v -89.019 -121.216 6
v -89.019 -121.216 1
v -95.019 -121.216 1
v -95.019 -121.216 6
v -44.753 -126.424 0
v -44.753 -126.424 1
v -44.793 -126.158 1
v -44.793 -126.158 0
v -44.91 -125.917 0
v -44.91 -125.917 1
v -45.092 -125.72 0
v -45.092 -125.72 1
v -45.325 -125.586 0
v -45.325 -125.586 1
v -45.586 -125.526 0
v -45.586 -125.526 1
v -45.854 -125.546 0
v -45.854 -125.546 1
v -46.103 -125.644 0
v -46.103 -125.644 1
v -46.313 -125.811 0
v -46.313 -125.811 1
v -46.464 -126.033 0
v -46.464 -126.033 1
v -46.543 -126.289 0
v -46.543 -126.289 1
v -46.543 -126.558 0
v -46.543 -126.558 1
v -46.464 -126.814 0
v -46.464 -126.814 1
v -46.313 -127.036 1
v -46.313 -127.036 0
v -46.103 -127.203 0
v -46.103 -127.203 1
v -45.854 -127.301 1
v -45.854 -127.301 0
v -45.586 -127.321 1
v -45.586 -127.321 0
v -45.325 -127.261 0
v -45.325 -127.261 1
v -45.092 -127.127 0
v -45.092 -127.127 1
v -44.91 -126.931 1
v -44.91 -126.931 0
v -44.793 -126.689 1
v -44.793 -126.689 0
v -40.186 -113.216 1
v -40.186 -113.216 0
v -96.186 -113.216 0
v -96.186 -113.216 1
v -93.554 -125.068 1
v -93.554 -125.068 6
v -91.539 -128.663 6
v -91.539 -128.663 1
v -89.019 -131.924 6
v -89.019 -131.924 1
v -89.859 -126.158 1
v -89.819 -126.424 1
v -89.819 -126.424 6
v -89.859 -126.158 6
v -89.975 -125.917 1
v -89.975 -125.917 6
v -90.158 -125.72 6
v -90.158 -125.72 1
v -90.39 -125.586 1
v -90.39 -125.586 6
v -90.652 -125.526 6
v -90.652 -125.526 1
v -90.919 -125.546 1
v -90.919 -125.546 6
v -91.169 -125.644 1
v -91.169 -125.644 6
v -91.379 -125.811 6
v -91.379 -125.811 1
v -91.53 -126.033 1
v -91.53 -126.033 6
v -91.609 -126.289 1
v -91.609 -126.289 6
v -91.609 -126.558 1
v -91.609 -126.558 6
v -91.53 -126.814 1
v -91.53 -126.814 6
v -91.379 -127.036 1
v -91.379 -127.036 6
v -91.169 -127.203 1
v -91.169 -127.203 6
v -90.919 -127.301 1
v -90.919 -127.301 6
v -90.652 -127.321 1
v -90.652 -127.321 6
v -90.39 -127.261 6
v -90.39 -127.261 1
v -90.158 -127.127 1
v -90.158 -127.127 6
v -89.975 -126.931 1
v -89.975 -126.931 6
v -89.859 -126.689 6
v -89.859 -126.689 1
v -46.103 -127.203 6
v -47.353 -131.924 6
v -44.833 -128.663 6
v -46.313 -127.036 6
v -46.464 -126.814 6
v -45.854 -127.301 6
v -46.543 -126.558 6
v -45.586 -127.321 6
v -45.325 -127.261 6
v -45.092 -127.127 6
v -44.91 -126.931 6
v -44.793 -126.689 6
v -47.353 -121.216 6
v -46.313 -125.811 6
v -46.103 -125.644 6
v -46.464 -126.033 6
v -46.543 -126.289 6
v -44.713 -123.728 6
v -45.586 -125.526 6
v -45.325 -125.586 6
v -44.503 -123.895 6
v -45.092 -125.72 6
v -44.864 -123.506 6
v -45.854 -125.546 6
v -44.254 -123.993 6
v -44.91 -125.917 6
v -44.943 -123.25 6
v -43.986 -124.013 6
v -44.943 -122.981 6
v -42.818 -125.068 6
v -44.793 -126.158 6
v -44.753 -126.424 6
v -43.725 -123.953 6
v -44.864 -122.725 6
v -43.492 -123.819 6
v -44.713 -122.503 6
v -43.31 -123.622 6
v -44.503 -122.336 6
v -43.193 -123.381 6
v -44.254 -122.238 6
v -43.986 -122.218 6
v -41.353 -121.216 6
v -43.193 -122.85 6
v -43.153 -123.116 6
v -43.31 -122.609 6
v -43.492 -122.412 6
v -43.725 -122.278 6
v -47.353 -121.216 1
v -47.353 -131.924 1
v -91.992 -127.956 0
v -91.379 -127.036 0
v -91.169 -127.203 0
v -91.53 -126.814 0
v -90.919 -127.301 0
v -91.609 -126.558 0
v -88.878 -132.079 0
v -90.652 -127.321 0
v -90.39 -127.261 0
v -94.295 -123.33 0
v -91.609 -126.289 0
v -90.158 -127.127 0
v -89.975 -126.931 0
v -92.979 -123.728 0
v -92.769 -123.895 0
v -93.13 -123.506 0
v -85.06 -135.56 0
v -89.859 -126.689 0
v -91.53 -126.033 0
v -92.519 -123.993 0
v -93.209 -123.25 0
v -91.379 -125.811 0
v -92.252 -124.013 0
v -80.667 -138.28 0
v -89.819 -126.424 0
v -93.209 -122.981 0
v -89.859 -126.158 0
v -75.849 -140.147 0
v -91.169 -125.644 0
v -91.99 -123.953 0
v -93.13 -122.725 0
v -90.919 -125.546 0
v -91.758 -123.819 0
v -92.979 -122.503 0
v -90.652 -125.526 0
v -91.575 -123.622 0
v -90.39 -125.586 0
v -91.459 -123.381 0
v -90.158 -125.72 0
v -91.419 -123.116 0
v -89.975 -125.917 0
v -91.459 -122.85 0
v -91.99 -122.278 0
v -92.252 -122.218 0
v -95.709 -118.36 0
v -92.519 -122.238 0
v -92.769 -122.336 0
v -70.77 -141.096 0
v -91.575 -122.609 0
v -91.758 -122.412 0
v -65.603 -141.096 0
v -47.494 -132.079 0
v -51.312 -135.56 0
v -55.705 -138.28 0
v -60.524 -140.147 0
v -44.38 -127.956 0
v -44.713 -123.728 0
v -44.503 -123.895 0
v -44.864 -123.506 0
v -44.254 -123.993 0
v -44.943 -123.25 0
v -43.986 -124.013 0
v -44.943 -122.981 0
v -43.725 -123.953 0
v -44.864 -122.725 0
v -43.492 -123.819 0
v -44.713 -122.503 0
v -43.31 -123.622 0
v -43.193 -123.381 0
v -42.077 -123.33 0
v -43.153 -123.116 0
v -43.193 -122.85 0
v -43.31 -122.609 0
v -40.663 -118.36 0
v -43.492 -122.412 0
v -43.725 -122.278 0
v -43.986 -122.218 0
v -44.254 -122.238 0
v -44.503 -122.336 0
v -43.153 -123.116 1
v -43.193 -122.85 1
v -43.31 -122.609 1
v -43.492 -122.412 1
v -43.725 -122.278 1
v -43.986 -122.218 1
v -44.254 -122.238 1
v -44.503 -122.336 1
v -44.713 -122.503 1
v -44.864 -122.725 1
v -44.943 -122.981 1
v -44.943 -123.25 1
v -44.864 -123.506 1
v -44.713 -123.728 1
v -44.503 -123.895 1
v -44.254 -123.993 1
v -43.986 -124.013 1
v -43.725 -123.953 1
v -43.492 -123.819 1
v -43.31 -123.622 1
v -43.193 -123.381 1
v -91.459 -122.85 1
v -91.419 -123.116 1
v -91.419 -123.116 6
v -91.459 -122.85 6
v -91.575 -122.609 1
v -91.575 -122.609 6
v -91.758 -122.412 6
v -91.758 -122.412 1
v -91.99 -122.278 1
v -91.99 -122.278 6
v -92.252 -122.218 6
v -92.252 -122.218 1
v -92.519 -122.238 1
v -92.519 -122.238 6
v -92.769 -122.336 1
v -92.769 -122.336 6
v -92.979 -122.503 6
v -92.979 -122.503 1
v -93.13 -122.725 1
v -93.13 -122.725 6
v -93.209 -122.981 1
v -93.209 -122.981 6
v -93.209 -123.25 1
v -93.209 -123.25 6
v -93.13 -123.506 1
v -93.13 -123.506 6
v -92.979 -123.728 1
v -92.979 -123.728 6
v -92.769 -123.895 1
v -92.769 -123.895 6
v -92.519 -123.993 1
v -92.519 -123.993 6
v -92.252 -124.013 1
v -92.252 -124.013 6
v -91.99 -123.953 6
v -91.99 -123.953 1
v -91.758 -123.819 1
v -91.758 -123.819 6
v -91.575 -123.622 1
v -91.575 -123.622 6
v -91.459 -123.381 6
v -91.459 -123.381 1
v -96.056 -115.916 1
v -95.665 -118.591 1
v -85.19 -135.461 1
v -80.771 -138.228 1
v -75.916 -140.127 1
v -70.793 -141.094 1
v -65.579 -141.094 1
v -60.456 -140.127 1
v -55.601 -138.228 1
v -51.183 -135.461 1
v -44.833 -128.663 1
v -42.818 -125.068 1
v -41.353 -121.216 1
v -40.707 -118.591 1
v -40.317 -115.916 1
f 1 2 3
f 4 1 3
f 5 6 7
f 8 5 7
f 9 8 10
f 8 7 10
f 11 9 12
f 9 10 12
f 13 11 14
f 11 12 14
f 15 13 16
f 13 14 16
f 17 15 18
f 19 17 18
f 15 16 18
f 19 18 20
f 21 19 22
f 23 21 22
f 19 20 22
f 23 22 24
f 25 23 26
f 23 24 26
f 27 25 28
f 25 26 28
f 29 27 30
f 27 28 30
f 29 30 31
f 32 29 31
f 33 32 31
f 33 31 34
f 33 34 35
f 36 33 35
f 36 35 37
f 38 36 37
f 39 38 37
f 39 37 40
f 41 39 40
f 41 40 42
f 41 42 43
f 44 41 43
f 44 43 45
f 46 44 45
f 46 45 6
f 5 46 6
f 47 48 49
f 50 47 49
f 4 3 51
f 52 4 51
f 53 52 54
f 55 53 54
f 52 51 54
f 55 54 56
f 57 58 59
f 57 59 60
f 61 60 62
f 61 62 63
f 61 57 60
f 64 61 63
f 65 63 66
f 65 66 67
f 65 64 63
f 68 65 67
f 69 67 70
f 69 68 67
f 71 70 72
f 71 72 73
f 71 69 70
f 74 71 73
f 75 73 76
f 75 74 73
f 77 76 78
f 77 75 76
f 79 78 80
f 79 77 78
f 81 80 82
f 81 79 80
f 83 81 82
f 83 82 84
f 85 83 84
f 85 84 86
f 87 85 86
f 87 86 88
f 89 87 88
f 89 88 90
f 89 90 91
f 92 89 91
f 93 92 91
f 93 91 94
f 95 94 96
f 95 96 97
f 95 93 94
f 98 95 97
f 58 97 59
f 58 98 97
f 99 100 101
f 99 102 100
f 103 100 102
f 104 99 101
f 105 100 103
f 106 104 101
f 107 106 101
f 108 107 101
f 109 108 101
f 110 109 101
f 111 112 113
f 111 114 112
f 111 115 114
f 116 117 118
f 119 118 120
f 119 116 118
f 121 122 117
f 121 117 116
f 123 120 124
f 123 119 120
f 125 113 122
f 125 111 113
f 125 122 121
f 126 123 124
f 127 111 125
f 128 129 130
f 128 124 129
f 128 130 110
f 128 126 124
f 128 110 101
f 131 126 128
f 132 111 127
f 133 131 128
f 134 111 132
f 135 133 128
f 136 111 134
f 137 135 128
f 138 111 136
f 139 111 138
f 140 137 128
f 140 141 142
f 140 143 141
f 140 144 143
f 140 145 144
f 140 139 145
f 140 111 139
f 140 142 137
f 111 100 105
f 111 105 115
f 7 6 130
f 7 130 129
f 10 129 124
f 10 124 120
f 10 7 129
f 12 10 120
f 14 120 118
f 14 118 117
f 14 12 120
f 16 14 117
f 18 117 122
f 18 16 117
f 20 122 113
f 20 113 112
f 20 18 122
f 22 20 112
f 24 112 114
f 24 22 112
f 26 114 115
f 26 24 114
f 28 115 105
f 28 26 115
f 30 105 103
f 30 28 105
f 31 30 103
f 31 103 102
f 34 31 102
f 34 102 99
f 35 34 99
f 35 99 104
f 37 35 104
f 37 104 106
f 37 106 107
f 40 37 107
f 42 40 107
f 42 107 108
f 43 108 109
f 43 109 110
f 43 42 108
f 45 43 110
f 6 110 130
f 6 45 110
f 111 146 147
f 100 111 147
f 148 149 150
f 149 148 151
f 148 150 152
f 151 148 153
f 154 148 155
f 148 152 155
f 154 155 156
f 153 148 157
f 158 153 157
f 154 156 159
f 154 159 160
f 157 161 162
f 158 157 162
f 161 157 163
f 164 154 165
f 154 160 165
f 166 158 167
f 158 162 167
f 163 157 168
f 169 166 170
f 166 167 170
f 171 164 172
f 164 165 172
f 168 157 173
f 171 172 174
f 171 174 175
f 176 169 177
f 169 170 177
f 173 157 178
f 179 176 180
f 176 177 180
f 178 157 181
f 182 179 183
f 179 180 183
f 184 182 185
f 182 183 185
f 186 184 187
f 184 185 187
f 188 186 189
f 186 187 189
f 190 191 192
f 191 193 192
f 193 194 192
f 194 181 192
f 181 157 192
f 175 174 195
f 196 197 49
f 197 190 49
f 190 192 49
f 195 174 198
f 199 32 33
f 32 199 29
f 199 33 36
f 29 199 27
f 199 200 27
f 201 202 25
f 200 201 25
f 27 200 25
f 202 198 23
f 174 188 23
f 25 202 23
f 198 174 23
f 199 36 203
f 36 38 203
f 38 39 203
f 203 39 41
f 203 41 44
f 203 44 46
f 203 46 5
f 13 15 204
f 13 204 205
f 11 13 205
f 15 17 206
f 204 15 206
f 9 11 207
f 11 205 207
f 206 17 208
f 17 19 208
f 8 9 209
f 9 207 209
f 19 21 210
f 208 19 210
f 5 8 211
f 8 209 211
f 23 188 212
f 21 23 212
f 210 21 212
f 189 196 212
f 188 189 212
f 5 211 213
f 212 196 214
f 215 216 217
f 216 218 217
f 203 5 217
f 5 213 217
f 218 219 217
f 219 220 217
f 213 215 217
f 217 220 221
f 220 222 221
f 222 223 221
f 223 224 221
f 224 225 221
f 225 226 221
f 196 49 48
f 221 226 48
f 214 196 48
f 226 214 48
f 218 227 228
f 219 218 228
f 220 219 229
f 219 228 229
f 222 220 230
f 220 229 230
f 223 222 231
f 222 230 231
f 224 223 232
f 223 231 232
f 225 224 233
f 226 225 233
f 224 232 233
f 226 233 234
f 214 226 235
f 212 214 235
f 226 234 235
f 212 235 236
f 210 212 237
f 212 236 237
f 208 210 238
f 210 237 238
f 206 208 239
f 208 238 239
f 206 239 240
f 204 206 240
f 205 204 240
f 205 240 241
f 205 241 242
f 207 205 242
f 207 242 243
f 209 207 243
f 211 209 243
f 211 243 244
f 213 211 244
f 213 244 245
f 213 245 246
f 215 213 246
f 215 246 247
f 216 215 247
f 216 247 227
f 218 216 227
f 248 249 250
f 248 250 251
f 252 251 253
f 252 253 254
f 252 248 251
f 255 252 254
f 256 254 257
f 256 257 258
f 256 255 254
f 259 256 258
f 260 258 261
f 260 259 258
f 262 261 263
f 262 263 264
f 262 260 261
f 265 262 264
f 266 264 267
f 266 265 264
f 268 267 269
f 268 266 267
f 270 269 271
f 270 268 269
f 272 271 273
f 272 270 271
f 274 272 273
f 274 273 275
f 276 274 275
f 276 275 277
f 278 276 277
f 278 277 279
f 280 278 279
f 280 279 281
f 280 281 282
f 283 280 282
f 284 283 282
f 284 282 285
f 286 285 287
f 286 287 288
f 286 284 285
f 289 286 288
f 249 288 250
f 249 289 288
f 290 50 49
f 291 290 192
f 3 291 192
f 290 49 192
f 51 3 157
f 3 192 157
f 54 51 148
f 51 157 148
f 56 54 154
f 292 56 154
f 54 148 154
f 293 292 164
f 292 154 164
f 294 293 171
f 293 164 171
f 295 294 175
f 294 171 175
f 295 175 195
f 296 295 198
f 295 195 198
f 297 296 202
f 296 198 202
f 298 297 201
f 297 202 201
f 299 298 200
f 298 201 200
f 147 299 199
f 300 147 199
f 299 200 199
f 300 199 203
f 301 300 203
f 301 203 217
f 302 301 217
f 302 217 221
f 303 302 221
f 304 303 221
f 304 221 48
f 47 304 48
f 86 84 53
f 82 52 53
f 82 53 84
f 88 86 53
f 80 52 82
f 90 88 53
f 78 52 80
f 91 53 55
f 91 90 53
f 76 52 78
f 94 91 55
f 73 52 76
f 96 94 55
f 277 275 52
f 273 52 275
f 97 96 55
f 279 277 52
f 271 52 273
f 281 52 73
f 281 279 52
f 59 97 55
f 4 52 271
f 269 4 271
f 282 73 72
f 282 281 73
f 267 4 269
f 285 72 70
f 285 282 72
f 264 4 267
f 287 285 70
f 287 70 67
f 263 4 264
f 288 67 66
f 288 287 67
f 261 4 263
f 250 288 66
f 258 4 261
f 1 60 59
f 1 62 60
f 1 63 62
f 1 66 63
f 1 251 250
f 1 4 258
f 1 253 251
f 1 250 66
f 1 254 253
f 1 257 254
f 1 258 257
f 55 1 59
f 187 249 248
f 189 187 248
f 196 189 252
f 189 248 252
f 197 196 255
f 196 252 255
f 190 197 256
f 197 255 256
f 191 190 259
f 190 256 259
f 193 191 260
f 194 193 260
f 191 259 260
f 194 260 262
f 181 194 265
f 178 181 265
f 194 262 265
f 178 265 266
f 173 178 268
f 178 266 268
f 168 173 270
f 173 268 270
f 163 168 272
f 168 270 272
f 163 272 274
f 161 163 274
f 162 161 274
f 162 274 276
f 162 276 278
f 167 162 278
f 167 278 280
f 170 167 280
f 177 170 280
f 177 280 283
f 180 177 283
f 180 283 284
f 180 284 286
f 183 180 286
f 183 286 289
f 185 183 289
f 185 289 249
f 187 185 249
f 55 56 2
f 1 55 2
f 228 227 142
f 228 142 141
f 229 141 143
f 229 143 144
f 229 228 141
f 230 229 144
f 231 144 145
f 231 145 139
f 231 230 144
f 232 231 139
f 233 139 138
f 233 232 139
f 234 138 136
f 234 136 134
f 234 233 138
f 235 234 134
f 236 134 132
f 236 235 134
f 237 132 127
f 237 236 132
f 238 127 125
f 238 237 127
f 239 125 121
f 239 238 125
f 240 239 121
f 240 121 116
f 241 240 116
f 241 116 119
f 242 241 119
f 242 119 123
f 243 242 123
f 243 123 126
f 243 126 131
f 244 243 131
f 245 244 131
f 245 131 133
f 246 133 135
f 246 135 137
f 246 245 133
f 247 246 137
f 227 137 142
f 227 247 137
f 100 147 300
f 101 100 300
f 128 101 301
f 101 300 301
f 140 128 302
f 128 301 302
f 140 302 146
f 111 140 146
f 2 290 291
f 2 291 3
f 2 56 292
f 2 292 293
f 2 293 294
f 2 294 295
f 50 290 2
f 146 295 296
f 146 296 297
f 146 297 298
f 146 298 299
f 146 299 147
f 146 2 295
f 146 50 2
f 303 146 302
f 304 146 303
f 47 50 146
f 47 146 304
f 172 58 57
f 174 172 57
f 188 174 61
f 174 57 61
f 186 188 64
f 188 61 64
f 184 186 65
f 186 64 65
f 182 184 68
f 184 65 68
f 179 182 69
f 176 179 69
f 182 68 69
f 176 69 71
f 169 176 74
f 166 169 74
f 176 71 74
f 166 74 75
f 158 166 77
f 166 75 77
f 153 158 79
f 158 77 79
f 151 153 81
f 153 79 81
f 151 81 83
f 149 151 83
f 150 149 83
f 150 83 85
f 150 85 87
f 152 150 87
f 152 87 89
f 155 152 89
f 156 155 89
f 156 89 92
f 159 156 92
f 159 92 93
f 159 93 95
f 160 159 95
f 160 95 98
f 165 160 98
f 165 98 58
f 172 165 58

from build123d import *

# Parameters (mm, degrees)
F1_DEPTH = 1
F2_R     = 0.9
F3_DEPTH = 5
F4_DEPTH = 1.001


with BuildPart() as f1:
    # F0 (on Top) → F1 (new body)
    with BuildSketch(Plane.XY):
        with BuildLine():
            ThreePointArc((-96.1861413951, -113.2155081954), (-68.1861413951, -141.2155081954), (-40.1861413951, -113.2155081954))
            Line((-40.1861413951, -113.2155081954), (-96.1861413951, -113.2155081954))
        make_face()
    extrude(amount=F1_DEPTH)

    # F2 (on face) → F3 (join)
    with BuildSketch(Plane.XY.offset(1)):
        with BuildLine():
            Line((-89.0189571251, -121.2155081954), (-95.0189571251, -121.2155081954))
            ThreePointArc((-95.0189571251, -121.2155081954), (-92.6129518517, -126.9023972105), (-89.0189571251, -131.9236291261))
            Line((-89.0189571251, -131.9236291261), (-89.0189571251, -121.2155081954))
        make_face()
        with Locations((-90.7189571251, -126.4236291261)):
            Circle(F2_R, mode=Mode.SUBTRACT)
        with Locations((-92.3189571251, -123.1155081954)):
            Circle(F2_R, mode=Mode.SUBTRACT)
        with BuildLine():
            Line((-47.3533256651, -121.2155081954), (-47.3533256651, -131.9236291261))
            ThreePointArc((-47.3533256651, -131.9236291261), (-43.7593309384, -126.9023972105), (-41.3533256651, -121.2155081954))
            Line((-41.3533256651, -121.2155081954), (-47.3533256651, -121.2155081954))
        make_face()
        with Locations((-45.6533256651, -126.4236291261)):
            Circle(F2_R, mode=Mode.SUBTRACT)
        with Locations((-44.0533256651, -123.1155081954)):
            Circle(F2_R, mode=Mode.SUBTRACT)
    extrude(amount=F3_DEPTH)

    # F2 (on face) → F4 (cut, through all)
    with BuildSketch(Plane.XY.offset(1)):
        with Locations((-92.3189571251, -123.1155081954)):
            Circle(F2_R)
        with Locations((-90.7189571251, -126.4236291261)):
            Circle(F2_R)
        with Locations((-44.0533256651, -123.1155081954)):
            Circle(F2_R)
        with Locations((-45.6533256651, -126.4236291261)):
            Circle(F2_R)
    extrude(amount=-F4_DEPTH, mode=Mode.SUBTRACT)


solid = f1.part
